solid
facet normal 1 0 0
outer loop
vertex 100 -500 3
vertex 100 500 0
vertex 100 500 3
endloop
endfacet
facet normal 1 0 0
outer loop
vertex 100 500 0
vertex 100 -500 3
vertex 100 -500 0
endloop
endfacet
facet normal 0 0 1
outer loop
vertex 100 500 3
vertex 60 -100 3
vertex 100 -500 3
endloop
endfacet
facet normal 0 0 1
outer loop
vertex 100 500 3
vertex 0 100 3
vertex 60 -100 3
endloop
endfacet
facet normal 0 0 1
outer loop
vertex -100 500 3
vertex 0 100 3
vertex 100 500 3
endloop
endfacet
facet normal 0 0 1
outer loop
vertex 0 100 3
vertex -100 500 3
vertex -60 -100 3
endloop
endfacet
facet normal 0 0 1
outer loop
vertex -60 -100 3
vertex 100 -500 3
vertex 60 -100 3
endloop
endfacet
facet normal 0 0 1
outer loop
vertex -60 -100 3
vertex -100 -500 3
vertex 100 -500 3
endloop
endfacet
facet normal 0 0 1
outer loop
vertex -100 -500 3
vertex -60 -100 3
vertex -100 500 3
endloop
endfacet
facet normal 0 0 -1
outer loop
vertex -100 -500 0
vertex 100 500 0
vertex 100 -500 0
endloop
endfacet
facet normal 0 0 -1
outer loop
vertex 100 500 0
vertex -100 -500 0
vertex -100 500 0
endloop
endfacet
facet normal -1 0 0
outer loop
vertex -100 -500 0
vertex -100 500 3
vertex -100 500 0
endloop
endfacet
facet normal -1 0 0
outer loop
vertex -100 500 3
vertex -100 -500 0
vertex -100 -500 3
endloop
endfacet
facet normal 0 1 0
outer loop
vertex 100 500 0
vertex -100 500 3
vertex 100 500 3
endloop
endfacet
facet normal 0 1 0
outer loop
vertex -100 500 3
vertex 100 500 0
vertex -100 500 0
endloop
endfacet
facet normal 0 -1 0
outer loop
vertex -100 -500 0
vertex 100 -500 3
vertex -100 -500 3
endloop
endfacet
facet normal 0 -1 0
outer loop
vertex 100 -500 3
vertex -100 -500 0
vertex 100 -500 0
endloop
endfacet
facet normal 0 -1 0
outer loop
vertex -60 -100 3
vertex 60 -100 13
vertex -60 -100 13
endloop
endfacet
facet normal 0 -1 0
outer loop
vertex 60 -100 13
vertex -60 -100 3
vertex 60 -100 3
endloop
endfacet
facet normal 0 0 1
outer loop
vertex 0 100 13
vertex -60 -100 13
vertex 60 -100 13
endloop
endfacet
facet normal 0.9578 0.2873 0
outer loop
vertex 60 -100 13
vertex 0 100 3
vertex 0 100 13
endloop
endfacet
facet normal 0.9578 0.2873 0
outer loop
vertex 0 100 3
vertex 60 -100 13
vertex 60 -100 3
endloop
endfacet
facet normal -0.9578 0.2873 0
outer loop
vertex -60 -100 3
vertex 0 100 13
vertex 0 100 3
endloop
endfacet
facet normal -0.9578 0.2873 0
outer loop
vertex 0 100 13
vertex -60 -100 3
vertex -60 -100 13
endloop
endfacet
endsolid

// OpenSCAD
// Dimensions in mm
plate_x = 200;   // Width (X-axis, spanwise)
plate_y = 1000;  // Length (Y-axis, flow direction)
plate_z = 3;     // Thickness of the sheet (Z-axis)

// Triangle dimensions
triangle_length = 200; // Length along Y
triangle_width = 120;  // Width along X (spreads flow towards sides)
triangle_h = 10;       // Protrusion height above plate

$fn = 50;

union() {
    // 1. Base metal sheet
    translate([-plate_x/2, -plate_y/2, 0])
        cube([plate_x, plate_y, plate_z]);

    // 2. Triangular protrusion pointing upstream (+Y direction)
    translate([0, 0, plate_z]) {
        linear_extrude(height = triangle_h) {
            polygon(points = [
                [0, triangle_length/2],                  // Apex pointing upstream (+Y)
                [triangle_width/2, -triangle_length/2],   // Back right
                [-triangle_width/2, -triangle_length/2]   // Back left
            ]);
        }
    }
}
